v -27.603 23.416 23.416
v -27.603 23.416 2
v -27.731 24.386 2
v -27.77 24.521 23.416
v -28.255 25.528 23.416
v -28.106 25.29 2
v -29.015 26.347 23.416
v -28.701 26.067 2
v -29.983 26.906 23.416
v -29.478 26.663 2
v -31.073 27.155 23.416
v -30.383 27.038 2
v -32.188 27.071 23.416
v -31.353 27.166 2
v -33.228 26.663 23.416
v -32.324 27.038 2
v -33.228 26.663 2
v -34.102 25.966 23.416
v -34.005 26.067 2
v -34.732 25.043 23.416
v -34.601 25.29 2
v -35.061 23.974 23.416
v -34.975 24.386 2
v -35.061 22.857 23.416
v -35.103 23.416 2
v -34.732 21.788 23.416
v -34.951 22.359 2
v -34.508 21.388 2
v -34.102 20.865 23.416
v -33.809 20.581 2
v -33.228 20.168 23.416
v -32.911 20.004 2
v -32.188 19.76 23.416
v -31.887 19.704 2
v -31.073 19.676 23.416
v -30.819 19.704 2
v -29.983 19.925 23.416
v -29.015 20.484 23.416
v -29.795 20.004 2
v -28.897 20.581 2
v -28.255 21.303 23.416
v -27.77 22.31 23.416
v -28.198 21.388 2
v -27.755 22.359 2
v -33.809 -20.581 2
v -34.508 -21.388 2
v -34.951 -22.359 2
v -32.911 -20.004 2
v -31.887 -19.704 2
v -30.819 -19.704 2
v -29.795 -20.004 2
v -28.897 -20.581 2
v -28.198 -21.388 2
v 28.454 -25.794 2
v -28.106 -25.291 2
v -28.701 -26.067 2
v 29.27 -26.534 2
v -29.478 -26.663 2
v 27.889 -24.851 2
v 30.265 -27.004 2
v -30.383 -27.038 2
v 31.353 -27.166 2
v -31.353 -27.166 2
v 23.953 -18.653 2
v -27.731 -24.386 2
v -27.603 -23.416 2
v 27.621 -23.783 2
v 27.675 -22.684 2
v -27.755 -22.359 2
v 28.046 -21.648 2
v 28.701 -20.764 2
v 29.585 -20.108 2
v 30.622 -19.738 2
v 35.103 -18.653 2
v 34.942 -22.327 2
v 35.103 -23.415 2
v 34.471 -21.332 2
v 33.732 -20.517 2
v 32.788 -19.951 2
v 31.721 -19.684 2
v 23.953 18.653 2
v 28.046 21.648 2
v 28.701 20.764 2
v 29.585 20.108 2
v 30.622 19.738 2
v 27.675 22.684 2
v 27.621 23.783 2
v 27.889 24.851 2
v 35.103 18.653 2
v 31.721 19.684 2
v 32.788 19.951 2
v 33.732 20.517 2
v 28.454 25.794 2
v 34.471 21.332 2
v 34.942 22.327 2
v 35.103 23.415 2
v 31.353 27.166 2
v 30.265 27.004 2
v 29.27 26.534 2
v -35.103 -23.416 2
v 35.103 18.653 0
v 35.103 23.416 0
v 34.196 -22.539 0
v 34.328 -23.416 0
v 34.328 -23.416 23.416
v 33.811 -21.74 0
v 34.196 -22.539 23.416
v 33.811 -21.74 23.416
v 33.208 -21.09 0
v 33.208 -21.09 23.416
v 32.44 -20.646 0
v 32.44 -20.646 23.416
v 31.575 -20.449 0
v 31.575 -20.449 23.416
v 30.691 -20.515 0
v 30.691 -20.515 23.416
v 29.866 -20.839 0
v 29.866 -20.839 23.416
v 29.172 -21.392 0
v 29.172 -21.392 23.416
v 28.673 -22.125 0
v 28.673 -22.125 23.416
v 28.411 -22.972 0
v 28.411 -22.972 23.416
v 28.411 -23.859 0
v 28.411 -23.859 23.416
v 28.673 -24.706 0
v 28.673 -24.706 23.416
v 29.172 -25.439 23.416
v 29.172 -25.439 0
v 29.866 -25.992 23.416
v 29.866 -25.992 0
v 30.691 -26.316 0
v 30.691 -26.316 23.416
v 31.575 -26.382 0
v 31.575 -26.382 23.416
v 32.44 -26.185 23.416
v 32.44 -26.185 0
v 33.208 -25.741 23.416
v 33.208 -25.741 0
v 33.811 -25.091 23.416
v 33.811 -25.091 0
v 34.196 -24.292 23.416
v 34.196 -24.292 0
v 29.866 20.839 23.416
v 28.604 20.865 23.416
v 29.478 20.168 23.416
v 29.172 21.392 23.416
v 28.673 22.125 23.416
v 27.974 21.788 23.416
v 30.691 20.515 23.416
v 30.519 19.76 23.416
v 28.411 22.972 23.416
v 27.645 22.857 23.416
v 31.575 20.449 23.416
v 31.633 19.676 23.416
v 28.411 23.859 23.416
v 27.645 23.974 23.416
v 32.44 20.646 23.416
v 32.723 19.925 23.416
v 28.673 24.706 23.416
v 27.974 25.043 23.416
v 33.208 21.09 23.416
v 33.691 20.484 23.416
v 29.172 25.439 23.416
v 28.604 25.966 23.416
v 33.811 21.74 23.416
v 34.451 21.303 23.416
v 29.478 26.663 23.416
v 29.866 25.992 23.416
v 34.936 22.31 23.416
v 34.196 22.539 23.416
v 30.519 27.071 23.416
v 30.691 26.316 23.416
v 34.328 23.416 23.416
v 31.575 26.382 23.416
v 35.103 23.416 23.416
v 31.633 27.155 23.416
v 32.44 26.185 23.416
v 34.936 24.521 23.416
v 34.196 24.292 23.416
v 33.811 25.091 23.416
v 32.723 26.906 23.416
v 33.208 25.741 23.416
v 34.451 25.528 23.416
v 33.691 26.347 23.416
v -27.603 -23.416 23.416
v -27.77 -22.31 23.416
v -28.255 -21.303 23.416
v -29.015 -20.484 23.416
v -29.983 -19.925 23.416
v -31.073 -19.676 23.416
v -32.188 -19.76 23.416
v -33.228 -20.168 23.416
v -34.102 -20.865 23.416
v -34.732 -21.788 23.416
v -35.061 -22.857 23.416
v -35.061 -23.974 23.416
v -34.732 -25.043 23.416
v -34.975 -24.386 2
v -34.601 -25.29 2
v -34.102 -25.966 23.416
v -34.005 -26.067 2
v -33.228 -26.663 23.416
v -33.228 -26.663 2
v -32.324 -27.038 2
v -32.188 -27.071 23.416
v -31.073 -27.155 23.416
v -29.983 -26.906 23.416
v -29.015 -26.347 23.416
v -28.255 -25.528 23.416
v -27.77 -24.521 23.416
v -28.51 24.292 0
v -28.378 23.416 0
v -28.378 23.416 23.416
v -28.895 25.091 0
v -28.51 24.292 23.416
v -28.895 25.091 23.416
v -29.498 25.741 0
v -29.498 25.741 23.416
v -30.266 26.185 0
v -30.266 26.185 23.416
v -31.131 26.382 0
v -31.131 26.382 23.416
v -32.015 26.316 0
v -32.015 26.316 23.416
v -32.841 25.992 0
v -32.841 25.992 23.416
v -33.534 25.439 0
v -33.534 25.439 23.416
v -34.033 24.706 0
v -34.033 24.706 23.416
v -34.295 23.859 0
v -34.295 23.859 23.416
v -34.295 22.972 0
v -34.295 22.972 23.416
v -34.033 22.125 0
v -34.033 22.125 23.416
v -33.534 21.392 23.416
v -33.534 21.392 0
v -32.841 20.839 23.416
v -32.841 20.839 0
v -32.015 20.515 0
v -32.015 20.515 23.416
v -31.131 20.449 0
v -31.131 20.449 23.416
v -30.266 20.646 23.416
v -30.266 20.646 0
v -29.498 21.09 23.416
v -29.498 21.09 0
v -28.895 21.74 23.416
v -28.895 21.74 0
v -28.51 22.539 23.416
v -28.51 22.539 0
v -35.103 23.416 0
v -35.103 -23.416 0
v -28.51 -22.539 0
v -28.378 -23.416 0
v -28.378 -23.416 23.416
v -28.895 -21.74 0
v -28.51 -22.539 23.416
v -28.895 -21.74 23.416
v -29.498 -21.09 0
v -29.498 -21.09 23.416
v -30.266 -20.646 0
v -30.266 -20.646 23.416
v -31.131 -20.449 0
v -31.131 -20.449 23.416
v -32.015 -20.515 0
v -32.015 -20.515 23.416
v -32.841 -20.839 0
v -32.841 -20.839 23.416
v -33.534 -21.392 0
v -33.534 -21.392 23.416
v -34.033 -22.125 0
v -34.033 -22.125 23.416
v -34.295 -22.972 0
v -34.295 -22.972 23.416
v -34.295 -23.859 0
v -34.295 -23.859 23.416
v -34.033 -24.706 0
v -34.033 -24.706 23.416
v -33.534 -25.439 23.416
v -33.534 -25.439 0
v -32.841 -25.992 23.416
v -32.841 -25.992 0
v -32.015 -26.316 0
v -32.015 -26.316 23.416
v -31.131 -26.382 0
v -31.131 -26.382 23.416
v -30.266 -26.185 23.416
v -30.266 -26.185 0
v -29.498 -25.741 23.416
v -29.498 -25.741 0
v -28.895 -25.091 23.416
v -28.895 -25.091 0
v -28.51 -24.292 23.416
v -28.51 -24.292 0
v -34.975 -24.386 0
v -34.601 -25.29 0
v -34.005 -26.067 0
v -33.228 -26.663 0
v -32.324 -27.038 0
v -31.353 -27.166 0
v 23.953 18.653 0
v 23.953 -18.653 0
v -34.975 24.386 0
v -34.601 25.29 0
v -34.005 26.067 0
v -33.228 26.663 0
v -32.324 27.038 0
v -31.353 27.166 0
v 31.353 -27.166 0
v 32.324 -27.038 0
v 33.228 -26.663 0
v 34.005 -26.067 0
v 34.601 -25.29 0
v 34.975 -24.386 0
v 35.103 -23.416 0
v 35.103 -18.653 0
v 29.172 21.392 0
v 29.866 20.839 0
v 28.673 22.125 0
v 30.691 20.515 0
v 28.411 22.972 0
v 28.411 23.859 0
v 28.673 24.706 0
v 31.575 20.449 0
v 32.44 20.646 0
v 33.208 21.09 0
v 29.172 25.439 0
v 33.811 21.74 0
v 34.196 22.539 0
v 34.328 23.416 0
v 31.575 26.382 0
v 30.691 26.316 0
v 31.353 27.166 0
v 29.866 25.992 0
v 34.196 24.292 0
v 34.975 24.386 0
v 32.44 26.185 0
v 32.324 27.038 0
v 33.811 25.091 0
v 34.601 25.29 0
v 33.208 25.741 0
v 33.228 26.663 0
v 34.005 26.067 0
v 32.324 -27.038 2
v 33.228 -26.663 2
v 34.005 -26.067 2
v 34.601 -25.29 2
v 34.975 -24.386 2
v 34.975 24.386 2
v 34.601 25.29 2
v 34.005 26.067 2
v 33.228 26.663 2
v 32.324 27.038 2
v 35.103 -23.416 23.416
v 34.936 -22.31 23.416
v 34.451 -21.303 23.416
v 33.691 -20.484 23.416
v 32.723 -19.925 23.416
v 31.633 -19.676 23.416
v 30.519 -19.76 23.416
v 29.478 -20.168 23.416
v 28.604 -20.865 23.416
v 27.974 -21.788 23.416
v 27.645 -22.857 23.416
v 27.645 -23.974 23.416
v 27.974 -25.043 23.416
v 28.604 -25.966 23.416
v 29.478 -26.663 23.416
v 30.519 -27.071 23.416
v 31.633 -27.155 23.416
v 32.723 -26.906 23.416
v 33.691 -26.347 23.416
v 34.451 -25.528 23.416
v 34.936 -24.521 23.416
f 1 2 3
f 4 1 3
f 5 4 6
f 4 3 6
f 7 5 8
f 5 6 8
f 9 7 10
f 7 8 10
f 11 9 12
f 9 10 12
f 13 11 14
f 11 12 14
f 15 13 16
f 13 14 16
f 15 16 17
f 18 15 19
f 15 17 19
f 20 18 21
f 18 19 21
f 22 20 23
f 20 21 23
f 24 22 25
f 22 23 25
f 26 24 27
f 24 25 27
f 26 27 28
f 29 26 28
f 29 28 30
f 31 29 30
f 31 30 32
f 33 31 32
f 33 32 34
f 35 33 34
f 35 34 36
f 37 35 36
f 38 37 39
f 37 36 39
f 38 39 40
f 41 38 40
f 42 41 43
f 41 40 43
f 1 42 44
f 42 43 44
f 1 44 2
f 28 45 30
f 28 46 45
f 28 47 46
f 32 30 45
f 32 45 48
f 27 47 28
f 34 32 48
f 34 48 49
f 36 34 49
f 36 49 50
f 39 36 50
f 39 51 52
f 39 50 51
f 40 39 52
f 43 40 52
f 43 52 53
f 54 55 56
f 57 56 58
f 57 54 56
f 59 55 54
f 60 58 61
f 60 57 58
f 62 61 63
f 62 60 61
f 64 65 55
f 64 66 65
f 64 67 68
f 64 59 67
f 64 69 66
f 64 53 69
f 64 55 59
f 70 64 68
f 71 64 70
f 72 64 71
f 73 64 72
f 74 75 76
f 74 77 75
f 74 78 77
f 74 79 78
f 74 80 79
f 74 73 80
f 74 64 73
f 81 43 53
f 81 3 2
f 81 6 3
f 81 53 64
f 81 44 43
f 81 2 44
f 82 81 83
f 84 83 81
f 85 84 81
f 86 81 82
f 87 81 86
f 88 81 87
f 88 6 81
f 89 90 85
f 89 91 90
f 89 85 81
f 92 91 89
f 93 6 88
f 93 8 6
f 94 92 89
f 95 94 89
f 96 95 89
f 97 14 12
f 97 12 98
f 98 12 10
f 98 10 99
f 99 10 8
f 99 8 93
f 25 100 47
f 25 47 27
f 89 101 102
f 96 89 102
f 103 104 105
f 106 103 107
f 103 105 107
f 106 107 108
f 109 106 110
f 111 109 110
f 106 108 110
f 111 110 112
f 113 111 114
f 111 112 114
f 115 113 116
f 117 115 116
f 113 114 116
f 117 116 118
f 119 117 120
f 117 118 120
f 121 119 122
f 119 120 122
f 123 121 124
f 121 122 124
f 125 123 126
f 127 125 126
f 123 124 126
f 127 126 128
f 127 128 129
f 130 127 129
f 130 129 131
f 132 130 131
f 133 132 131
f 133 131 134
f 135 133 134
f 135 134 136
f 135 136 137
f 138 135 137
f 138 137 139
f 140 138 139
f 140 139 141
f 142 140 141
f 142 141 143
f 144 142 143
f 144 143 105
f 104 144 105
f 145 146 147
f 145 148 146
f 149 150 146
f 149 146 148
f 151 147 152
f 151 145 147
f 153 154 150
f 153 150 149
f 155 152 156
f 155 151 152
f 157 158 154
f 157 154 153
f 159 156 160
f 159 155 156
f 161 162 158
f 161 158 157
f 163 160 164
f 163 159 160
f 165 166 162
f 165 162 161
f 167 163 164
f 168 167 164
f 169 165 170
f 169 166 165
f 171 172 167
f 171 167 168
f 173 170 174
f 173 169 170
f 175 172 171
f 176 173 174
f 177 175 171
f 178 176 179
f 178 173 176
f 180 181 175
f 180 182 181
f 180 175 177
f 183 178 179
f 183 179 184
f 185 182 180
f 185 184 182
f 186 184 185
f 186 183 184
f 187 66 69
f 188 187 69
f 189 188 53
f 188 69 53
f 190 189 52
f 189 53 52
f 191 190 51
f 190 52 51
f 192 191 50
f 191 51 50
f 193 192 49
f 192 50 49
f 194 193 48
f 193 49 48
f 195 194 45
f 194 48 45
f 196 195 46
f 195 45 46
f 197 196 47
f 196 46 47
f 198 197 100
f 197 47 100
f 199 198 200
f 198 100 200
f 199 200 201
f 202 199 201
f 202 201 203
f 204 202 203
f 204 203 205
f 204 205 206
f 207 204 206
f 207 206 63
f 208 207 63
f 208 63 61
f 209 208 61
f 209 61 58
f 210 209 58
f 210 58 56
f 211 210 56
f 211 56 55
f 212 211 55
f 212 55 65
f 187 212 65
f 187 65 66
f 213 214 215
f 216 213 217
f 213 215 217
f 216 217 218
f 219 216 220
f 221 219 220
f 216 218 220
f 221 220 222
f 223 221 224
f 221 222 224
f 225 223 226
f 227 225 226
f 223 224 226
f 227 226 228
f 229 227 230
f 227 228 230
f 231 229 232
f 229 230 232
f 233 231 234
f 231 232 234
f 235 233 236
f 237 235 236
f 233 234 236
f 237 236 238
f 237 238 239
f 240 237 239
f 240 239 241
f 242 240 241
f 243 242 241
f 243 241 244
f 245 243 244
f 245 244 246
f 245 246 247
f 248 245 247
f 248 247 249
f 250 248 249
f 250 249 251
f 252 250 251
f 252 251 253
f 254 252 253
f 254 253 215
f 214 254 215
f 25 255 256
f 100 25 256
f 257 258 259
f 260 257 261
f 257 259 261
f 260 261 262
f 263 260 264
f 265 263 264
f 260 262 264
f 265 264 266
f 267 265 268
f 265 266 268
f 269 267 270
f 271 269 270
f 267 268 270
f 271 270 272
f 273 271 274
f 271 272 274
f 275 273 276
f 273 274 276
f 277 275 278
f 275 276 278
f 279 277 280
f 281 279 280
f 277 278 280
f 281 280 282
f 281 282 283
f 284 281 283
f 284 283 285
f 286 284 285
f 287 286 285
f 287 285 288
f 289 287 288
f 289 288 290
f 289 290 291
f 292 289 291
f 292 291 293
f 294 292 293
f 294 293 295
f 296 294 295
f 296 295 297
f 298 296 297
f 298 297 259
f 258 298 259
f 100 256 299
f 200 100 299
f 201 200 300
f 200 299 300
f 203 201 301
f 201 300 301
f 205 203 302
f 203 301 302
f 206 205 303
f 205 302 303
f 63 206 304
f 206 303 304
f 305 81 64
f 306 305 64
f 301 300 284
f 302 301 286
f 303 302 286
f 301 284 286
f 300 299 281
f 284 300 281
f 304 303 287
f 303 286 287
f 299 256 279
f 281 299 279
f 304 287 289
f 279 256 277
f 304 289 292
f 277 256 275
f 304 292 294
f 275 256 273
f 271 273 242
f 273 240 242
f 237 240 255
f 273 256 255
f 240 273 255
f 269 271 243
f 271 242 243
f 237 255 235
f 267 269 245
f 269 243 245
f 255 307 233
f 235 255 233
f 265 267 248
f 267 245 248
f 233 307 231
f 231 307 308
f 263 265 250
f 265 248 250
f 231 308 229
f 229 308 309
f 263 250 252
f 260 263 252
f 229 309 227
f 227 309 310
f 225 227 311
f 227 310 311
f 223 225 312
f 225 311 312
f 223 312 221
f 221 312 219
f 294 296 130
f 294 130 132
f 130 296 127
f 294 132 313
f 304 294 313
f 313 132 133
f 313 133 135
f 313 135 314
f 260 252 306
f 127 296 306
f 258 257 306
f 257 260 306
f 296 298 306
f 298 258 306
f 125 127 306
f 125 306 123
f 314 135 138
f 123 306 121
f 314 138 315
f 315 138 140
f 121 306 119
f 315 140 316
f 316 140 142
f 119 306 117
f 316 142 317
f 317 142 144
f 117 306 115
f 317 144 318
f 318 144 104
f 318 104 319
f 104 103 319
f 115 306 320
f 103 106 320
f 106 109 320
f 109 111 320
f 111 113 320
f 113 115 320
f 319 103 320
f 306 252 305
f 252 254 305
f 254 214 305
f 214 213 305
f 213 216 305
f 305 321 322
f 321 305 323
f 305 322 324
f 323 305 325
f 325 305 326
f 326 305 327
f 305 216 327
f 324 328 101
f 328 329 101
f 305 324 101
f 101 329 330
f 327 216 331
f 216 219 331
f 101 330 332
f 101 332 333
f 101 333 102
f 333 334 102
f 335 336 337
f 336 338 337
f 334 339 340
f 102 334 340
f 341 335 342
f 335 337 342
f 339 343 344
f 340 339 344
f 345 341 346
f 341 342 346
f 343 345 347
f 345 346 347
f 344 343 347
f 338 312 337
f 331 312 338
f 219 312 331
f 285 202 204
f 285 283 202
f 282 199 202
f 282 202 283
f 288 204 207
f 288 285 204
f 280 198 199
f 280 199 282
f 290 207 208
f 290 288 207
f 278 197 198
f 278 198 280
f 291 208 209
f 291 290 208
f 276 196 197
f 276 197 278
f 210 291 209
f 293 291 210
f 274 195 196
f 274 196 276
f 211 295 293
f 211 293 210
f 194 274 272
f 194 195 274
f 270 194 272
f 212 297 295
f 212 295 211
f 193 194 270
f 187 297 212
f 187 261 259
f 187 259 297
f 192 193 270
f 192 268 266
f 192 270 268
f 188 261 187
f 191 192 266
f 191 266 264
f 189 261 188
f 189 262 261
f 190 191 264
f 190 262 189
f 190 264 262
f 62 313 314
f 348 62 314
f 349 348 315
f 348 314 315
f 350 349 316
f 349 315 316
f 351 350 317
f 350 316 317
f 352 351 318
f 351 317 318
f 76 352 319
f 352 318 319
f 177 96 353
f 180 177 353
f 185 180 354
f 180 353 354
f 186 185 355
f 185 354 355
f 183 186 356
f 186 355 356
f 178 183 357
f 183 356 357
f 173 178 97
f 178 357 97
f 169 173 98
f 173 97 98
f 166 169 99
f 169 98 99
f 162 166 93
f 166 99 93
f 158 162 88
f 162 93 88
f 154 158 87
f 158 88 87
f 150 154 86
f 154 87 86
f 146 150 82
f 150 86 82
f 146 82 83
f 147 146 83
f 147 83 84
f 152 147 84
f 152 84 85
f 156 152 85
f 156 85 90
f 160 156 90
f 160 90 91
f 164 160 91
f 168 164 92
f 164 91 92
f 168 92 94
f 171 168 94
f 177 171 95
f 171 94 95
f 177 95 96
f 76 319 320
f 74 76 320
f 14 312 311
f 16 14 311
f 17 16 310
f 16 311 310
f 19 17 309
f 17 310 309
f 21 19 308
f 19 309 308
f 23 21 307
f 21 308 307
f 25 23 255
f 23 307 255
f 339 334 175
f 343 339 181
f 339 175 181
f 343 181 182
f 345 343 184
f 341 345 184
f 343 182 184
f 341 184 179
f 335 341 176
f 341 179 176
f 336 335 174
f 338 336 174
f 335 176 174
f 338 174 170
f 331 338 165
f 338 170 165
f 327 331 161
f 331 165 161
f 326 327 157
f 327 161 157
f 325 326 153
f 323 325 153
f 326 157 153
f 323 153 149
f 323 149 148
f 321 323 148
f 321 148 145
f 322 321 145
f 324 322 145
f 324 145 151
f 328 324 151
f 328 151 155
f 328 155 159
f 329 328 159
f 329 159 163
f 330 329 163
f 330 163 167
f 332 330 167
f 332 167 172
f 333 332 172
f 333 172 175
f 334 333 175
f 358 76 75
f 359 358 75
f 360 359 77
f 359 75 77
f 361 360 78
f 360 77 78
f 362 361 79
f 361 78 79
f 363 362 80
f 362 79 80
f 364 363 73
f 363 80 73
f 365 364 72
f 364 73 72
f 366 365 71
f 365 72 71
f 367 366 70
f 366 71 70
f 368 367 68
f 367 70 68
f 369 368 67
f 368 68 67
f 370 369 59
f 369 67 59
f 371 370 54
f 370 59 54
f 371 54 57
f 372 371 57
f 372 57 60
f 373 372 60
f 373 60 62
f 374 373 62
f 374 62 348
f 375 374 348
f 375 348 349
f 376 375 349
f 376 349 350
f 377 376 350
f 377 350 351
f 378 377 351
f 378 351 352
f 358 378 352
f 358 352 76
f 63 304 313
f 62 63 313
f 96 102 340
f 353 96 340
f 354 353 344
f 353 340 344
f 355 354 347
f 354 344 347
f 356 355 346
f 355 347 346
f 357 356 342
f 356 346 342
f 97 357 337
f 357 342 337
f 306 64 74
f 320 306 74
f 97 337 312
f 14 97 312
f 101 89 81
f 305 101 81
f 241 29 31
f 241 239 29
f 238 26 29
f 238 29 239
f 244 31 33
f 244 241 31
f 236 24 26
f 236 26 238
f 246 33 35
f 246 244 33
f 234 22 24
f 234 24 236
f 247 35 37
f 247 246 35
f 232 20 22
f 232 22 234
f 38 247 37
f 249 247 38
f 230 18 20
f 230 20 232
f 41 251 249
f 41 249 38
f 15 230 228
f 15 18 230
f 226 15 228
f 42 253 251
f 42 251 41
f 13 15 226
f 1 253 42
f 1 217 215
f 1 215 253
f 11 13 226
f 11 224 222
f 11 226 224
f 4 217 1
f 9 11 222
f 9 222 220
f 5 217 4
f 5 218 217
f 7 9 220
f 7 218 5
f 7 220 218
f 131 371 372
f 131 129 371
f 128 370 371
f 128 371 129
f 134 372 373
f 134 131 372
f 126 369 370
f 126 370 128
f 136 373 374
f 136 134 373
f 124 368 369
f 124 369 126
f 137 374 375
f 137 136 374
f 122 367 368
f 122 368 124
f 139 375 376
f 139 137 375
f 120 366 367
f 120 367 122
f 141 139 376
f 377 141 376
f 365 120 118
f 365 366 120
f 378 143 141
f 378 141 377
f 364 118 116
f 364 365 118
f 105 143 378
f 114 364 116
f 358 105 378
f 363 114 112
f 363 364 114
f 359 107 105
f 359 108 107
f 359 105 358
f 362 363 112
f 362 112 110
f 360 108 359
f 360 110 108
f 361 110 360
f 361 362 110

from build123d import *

# Parameters (mm, degrees)
F1_DEPTH = 2
F2_R     = 3.75
F3_DEPTH = 21.415625
F4_R     = 2.975
F5_DEPTH = 23.416625
F7_DEPTH = 2.001


with BuildPart() as f1:
    # F0 (on Top) → F1 (new body)
    with BuildSketch(Plane.XY):
        with BuildLine():
            Line((-31.3531, -27.1655), (31.3531, -27.1655))
            ThreePointArc((31.3531, -27.1655), (34.00475, -26.06715), (35.1031, -23.4155))
            Line((35.1031, -23.4155), (35.1031, 23.4155))
            ThreePointArc((35.1031, 23.4155), (34.00475, 26.06715), (31.3531, 27.1655))
            Line((31.3531, 27.1655), (-31.3531, 27.1655))
            ThreePointArc((-31.3531, 27.1655), (-34.00475, 26.06715), (-35.1031, 23.4155))
            Line((-35.1031, 23.4155), (-35.1031, -23.4155))
            ThreePointArc((-35.1031, -23.4155), (-34.00475, -26.06715), (-31.3531, -27.1655))
        make_face()
    extrude(amount=F1_DEPTH)

    # F2 (on face) → F3 (join)
    with BuildSketch(Plane.XY.offset(2)):
        with Locations((-31.3531, 23.4155)):
            Circle(F2_R)
        with Locations((31.3531, 23.4155)):
            Circle(F2_R)
        with Locations((-31.3531, -23.4155)):
            Circle(F2_R)
        with Locations((31.3531, -23.4155)):
            Circle(F2_R)
    extrude(amount=F3_DEPTH)

    # F4 (on face) → F5 (cut, through all)
    with BuildSketch(Plane.XY.offset(23.415625)):
        with Locations((-31.3531, 23.4155)):
            Circle(F4_R)
        with Locations((31.3531, 23.4155)):
            Circle(F4_R)
        with Locations((31.3531, -23.4155)):
            Circle(F4_R)
        with Locations((-31.3531, -23.4155)):
            Circle(F4_R)
    extrude(amount=-F5_DEPTH, mode=Mode.SUBTRACT)

    # F6 (on face) → F7 (cut, through all)
    with BuildSketch(Plane.XY.offset(2)):
        Polygon((23.9531, 18.653), (23.9531, 0), (23.9531, -18.653), (35.1031, -18.653), (35.1031, 18.653), align=None)
    extrude(amount=-F7_DEPTH, mode=Mode.SUBTRACT)


solid = f1.part
